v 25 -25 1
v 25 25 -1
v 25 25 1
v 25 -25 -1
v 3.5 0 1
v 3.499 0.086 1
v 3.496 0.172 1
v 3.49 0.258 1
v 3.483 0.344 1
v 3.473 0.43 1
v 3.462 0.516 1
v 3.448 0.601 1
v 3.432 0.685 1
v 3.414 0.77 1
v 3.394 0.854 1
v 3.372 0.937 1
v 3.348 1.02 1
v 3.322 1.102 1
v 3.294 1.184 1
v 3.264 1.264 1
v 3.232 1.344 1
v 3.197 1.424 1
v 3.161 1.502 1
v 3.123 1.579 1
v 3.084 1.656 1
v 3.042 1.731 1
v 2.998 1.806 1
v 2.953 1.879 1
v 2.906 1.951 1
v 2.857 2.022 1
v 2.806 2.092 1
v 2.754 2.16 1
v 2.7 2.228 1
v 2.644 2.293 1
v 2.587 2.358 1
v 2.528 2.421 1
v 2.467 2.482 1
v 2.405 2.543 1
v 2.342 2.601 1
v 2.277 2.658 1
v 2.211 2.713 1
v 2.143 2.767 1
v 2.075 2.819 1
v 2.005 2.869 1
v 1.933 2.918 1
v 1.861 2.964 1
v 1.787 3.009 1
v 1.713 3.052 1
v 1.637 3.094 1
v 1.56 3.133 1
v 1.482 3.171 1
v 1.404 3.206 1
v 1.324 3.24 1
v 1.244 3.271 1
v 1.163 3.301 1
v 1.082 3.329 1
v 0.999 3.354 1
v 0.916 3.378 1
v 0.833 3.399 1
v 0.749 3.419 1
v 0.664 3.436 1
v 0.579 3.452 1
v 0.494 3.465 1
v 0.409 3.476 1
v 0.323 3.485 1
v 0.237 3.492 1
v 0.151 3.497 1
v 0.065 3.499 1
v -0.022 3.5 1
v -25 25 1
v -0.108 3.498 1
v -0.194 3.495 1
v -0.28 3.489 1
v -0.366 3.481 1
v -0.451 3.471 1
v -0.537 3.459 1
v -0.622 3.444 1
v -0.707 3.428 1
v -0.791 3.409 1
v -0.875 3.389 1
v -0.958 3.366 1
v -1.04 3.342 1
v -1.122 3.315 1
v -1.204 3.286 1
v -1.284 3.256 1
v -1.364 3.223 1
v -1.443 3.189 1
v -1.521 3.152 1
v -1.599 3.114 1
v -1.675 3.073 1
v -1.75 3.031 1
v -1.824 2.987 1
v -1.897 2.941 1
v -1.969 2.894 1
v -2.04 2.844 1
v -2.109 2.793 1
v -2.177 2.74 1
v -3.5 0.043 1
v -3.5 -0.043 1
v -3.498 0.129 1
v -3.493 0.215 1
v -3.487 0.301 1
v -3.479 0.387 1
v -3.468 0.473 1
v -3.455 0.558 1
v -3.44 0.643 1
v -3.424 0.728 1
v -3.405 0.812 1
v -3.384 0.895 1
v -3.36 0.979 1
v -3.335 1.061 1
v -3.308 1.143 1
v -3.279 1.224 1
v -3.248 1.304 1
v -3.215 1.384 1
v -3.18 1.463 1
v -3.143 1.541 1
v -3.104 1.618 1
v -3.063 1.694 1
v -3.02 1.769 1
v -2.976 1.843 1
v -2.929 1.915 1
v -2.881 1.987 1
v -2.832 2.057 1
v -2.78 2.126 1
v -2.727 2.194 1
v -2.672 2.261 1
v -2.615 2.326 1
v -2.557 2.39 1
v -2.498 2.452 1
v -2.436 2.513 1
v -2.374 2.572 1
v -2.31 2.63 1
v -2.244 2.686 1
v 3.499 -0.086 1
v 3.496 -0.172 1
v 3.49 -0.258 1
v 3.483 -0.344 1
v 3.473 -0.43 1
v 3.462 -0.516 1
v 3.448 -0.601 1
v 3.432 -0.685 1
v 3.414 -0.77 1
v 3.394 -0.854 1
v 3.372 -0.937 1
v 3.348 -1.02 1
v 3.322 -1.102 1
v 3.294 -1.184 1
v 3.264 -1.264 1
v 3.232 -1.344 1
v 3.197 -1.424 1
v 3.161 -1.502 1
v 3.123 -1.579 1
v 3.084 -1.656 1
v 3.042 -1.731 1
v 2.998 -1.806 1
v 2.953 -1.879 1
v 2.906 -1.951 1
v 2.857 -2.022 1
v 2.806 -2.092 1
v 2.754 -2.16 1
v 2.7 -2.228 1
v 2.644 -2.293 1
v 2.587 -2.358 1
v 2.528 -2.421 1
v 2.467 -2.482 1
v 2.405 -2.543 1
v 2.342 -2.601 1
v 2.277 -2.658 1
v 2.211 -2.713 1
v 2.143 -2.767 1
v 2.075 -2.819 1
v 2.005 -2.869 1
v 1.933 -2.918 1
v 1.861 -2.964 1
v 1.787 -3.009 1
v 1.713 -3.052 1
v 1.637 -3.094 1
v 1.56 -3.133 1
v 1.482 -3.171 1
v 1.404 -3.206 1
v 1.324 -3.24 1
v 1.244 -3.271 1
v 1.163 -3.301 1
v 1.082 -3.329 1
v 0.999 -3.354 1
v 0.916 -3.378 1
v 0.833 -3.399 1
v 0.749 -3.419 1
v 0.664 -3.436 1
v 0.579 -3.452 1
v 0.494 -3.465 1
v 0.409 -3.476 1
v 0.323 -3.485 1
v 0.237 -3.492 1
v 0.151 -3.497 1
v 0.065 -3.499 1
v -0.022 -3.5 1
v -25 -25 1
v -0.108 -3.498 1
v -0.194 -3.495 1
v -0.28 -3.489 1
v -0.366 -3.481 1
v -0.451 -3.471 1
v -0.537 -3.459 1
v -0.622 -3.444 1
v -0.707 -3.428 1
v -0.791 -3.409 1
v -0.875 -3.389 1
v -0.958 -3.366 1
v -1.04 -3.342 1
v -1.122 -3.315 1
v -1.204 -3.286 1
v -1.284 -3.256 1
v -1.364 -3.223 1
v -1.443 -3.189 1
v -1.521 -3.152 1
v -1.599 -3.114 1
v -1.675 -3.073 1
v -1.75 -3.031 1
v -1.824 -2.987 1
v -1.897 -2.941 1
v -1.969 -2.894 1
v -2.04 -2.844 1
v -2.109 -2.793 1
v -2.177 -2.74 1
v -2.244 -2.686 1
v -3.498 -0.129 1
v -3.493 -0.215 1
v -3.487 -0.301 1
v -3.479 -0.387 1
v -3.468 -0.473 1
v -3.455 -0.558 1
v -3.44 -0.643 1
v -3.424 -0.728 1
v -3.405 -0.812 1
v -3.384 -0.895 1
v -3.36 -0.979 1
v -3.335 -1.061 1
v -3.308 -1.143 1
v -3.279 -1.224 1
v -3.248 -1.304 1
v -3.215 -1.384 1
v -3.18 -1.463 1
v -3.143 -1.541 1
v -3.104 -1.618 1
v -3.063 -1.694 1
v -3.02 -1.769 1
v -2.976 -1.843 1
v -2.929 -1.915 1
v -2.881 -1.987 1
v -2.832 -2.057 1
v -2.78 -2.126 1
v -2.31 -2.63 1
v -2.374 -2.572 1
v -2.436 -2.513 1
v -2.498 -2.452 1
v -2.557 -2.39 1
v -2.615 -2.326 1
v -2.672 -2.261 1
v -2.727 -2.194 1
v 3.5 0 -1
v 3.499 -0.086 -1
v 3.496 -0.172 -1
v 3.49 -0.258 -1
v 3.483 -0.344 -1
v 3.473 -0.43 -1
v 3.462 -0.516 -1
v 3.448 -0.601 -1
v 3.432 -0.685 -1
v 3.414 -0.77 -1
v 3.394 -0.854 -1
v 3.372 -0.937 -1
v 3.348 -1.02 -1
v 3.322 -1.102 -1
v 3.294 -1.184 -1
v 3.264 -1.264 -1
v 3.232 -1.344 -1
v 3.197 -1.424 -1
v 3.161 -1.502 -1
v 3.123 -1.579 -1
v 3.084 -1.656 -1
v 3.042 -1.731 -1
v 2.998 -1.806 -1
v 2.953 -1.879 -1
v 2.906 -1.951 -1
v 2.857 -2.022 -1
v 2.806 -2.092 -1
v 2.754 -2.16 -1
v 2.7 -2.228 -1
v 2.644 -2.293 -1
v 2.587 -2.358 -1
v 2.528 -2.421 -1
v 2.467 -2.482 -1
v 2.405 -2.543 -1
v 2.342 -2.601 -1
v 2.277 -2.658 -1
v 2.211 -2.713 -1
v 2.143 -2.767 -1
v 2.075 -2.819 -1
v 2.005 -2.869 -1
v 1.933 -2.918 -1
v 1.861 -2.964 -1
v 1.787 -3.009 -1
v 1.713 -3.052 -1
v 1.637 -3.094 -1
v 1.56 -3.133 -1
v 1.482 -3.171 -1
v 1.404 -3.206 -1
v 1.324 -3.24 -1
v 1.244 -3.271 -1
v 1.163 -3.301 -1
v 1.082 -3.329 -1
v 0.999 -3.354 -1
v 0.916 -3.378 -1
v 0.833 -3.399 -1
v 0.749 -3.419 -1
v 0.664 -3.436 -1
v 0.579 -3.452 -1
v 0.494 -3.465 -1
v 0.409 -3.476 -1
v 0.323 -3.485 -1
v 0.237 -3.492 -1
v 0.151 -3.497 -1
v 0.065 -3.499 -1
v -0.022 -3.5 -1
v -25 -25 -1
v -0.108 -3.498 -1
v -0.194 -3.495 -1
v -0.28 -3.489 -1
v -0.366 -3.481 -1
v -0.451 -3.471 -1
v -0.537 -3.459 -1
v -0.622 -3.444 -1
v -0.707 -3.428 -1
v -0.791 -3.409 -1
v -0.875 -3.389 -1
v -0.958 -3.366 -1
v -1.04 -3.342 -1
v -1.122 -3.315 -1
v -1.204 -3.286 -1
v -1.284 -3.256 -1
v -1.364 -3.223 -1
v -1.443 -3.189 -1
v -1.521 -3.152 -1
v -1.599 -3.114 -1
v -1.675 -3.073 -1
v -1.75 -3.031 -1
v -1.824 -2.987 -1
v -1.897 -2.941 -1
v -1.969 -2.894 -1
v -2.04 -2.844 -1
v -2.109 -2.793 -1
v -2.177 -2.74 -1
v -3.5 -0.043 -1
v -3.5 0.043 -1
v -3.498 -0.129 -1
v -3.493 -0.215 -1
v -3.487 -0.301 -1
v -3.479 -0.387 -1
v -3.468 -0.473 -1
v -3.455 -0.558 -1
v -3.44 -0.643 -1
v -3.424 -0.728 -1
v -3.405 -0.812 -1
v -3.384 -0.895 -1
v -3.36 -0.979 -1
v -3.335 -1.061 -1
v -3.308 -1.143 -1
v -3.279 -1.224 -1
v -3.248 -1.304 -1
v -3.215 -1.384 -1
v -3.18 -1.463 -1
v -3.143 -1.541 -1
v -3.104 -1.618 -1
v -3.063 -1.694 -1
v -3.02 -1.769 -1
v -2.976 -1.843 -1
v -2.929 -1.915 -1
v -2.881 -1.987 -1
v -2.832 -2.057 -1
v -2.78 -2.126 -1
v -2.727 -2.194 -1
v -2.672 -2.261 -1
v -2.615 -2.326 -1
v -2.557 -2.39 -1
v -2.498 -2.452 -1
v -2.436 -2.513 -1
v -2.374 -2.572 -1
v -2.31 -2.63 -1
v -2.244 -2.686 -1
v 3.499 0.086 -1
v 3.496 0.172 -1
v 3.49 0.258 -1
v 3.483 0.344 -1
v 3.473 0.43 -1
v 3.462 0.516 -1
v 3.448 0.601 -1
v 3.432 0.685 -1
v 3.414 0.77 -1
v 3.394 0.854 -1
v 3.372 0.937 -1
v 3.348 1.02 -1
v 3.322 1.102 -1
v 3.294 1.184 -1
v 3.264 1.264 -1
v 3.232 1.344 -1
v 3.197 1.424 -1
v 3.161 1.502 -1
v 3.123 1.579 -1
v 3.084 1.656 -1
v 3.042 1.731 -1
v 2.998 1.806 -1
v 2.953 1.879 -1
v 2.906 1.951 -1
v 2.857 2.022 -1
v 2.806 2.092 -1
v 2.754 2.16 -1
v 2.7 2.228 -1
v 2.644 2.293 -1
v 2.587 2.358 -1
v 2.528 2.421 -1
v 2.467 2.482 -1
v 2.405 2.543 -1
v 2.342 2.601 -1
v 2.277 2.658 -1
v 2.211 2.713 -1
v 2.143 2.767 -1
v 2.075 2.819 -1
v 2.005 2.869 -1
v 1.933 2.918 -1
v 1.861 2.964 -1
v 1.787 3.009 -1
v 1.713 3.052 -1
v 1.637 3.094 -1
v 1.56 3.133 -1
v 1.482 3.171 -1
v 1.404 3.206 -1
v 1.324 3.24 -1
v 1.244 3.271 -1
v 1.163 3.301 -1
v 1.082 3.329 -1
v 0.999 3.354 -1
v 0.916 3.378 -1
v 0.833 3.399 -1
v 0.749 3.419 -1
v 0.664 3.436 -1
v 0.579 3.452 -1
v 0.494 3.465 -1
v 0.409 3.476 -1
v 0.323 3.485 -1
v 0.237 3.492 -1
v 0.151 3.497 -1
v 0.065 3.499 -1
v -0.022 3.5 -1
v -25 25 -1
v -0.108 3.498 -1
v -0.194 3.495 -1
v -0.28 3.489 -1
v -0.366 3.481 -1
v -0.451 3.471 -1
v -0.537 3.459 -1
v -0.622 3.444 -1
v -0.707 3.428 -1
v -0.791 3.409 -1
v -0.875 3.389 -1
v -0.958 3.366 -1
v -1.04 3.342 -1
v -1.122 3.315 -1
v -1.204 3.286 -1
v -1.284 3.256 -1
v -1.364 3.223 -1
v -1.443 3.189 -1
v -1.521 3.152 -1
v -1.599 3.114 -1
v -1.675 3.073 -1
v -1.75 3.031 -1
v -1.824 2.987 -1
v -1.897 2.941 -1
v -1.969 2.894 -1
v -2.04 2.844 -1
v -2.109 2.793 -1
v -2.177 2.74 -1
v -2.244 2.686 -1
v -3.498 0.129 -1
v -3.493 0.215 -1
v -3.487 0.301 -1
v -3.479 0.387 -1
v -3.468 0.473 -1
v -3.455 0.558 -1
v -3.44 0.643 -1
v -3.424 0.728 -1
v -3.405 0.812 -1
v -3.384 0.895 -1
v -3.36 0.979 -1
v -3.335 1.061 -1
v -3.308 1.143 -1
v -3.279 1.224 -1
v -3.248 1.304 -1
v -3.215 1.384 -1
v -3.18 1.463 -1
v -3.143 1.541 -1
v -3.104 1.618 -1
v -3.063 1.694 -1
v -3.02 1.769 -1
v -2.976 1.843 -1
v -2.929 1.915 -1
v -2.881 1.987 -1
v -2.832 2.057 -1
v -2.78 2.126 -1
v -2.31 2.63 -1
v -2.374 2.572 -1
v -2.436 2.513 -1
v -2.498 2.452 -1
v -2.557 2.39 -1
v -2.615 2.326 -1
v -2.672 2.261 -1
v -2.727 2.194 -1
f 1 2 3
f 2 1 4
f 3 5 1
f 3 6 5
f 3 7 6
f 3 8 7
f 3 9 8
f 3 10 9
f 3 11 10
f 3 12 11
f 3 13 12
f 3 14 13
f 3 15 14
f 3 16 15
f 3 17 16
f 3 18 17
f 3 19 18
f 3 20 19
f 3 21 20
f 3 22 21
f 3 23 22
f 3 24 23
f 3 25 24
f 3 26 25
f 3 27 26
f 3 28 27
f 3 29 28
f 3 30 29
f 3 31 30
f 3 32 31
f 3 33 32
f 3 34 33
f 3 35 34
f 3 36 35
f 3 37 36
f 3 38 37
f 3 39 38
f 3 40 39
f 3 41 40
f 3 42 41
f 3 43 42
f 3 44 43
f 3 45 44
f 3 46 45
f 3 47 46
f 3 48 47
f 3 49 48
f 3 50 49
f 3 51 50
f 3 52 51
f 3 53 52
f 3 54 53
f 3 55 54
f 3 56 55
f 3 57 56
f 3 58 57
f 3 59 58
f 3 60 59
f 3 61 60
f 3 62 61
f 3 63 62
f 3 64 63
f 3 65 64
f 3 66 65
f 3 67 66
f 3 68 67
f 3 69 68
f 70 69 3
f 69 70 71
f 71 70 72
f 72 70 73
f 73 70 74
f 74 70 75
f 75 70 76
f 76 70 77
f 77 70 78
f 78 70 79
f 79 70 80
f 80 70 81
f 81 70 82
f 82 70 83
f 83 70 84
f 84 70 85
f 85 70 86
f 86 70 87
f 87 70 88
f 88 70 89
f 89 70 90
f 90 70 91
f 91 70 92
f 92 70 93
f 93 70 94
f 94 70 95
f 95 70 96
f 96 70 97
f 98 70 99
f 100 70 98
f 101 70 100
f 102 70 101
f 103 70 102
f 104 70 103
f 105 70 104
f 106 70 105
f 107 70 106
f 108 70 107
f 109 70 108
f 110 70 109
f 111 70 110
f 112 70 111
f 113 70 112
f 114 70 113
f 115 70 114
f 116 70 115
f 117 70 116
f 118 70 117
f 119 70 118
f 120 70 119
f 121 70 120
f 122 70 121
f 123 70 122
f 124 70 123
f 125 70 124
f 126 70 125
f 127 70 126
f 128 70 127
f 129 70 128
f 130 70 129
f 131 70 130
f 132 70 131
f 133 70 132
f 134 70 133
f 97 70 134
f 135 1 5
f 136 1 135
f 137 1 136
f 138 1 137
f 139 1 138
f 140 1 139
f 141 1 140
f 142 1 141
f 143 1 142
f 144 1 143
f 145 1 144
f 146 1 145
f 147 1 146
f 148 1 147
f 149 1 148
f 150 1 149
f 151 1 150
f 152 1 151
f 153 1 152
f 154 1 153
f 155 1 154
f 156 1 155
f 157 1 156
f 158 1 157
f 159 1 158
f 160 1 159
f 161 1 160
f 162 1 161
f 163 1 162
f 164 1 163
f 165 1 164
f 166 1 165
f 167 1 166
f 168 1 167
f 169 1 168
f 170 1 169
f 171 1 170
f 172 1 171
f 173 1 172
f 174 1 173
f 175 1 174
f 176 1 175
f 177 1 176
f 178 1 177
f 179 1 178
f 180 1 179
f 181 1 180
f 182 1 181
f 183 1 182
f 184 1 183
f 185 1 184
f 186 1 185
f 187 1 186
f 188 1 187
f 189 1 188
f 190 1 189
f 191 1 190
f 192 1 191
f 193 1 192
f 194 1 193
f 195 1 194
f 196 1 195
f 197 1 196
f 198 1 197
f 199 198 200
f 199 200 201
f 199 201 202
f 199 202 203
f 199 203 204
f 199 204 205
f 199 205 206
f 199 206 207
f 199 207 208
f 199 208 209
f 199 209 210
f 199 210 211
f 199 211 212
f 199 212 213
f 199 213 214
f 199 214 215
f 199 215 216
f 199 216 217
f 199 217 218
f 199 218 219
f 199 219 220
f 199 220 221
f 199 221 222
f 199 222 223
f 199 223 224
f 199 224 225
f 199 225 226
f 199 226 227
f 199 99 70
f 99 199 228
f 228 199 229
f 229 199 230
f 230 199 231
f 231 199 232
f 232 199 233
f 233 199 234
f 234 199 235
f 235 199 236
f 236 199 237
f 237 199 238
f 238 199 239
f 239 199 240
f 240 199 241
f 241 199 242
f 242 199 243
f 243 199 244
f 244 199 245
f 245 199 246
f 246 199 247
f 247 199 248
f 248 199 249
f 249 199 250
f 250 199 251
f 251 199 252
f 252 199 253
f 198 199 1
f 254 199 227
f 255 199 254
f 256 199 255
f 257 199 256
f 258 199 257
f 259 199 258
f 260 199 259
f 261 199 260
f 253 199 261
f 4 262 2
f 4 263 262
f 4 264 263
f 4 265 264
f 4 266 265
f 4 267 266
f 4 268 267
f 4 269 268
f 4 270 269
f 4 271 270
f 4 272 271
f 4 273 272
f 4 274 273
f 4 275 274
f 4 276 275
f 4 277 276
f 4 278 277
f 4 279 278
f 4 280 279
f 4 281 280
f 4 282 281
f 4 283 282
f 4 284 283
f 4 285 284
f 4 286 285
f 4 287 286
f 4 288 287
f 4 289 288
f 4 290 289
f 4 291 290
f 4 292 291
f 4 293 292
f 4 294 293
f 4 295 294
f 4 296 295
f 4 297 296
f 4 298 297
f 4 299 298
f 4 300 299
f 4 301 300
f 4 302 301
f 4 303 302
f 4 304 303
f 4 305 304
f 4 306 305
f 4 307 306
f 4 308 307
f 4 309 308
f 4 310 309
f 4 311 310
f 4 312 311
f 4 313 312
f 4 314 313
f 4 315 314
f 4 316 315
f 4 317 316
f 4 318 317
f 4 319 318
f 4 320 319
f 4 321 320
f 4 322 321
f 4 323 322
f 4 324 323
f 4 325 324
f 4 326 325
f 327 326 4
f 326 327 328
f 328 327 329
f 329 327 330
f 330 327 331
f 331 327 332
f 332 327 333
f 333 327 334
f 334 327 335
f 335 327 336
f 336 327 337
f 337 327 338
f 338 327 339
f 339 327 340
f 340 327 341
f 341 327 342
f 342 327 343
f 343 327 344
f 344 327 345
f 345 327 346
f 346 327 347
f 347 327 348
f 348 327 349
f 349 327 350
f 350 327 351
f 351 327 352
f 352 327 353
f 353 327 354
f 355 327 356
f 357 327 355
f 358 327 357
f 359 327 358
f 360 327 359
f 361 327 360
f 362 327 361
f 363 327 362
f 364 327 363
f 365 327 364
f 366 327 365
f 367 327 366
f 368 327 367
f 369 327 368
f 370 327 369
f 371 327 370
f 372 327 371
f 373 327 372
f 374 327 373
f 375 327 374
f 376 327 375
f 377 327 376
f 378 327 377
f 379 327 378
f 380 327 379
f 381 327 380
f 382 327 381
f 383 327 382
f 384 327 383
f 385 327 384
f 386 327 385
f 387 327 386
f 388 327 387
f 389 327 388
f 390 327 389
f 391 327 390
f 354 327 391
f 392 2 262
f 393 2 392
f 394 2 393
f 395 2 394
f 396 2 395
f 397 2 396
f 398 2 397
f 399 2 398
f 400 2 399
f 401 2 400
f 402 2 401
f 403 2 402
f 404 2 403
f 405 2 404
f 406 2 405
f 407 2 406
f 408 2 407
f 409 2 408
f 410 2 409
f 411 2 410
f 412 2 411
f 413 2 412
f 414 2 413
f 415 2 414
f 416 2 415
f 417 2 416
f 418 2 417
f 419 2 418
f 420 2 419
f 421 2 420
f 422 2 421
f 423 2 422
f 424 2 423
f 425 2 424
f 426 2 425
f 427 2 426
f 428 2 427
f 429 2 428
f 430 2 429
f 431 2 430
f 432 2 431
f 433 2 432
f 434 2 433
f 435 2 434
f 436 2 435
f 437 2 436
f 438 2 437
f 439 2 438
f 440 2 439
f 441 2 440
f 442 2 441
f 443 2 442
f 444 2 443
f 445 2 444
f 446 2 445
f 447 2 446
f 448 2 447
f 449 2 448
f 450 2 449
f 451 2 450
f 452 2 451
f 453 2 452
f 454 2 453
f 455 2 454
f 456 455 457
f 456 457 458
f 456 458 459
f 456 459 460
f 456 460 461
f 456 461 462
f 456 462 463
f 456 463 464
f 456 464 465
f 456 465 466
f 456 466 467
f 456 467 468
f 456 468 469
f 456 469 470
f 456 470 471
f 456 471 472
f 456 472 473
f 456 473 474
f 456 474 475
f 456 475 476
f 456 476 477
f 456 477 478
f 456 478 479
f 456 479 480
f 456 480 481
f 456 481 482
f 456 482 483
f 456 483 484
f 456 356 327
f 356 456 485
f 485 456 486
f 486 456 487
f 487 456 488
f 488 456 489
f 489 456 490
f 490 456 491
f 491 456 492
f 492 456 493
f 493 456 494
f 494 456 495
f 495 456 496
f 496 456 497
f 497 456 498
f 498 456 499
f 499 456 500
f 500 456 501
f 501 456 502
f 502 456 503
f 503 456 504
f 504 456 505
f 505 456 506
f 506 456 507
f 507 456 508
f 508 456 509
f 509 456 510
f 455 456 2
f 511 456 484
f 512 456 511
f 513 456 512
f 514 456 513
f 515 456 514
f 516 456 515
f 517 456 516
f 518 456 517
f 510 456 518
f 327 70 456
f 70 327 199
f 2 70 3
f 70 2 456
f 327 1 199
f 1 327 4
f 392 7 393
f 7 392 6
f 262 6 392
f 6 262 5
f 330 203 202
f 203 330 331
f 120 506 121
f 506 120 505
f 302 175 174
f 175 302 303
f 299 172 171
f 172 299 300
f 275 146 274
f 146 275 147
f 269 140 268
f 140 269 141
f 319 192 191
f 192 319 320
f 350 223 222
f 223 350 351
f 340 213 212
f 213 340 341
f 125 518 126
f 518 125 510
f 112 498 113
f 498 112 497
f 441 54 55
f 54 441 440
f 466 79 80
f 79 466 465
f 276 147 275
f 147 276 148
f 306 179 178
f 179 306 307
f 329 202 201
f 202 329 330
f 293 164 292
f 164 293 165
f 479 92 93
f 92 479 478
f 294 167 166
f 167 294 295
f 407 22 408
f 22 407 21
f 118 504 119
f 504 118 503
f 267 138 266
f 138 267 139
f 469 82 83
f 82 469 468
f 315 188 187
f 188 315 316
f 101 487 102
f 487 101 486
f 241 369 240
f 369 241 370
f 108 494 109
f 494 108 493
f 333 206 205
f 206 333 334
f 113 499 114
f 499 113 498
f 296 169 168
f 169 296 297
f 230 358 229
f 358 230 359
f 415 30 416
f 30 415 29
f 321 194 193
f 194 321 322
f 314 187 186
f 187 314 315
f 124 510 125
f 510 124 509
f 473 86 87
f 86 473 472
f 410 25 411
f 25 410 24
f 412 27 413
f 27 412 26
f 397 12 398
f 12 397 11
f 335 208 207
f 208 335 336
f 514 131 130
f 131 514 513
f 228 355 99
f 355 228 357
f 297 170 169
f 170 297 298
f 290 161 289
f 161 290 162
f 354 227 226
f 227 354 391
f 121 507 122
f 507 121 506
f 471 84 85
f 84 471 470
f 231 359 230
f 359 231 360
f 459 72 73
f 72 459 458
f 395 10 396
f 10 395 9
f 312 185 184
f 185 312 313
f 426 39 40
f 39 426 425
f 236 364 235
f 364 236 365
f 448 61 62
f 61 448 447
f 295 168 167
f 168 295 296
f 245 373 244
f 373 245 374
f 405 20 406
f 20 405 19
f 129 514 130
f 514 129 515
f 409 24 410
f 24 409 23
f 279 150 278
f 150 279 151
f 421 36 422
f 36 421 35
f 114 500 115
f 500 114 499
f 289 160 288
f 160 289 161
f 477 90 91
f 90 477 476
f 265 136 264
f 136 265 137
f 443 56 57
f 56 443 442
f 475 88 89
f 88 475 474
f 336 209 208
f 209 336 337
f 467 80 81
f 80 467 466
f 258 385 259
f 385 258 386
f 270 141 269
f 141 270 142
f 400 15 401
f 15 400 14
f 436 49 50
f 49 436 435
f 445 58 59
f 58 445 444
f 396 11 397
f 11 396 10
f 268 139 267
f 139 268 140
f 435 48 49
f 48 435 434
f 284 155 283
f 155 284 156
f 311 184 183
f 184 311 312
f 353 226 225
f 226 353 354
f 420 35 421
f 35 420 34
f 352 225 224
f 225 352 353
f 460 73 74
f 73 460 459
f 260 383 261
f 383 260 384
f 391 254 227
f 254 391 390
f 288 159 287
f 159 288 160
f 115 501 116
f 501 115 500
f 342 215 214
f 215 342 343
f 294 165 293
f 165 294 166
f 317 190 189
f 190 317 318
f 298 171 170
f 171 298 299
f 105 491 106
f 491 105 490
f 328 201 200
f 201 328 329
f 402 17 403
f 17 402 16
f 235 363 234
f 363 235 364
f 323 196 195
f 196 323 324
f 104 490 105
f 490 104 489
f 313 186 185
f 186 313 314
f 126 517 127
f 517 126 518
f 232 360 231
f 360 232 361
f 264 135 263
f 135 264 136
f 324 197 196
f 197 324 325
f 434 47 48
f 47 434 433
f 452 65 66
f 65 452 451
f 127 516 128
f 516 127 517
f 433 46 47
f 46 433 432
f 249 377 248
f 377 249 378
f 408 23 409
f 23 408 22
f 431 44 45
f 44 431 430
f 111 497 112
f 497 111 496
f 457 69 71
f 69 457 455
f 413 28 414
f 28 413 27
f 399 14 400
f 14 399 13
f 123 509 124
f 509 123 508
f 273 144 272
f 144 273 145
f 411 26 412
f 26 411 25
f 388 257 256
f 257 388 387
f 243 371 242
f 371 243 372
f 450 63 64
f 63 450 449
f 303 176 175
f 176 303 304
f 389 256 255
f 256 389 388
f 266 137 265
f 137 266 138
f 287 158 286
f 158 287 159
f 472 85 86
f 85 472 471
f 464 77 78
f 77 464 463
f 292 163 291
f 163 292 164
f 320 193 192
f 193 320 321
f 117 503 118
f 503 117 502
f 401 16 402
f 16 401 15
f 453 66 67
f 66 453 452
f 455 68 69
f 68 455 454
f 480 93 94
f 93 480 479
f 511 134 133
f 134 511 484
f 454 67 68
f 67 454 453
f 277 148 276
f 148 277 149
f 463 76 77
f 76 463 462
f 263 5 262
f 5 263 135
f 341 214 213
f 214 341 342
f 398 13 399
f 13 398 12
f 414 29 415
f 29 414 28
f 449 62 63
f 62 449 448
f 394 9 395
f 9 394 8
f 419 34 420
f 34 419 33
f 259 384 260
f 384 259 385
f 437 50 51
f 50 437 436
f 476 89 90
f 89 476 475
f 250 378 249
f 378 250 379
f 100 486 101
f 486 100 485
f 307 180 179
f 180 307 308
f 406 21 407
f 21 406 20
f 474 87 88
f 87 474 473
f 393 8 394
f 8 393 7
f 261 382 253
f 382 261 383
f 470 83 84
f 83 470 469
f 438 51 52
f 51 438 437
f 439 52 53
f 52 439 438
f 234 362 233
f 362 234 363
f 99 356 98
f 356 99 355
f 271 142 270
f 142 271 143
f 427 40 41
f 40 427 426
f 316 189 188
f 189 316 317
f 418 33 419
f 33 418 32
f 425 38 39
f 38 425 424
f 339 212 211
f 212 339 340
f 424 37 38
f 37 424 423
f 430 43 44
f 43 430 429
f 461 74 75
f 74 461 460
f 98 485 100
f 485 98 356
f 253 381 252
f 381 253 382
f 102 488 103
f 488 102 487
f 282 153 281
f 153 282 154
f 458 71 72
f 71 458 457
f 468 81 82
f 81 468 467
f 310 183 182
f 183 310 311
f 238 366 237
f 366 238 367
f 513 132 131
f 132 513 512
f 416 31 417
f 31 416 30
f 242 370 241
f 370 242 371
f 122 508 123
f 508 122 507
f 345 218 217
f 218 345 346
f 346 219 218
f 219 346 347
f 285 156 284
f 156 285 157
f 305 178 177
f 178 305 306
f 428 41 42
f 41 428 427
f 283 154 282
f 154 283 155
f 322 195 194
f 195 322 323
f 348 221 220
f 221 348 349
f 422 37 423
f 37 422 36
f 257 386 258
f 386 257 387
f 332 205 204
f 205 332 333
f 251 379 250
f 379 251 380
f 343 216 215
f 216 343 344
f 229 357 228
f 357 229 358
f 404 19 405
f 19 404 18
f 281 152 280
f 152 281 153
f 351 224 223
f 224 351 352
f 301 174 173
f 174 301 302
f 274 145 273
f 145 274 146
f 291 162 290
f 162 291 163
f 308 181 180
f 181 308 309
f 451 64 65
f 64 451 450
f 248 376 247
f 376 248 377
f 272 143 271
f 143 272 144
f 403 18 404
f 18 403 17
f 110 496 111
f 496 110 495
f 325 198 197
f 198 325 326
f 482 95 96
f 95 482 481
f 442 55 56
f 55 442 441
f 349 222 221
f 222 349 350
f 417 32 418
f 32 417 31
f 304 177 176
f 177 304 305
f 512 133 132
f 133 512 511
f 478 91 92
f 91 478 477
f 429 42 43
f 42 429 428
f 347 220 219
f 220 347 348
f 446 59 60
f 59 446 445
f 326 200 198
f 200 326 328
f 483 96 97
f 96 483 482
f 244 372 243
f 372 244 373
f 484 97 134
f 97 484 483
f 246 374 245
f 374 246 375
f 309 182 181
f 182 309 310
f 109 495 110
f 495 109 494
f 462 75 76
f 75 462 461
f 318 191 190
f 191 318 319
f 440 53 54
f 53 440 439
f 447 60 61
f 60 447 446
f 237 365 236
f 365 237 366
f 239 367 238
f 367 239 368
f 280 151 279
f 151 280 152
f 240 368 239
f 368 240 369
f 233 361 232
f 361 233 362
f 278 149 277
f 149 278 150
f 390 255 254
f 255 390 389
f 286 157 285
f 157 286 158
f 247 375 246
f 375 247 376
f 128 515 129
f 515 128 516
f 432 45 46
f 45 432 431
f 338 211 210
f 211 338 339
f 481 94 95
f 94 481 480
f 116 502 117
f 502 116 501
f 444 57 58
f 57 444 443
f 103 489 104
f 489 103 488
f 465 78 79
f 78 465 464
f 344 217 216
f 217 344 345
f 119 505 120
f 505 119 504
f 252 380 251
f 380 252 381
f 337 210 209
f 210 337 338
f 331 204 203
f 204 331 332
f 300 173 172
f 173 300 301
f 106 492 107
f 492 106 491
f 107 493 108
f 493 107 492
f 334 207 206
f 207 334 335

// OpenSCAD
/*
Prusa Lack Enclosure 2mm remix

Copyright 2024 nomike[AT]nomike[DOT]com
Original design by Prusa Research.

Redistribution and use in source and binary forms, with or without
modification, are permitted provided that the following conditions are met:

1. Redistributions of source code must retain the above copyright notice, this
list of conditions and the following disclaimer.

2. Redistributions in binary form must reproduce the above copyright notice,
this list of conditions and the following disclaimer in the documentation
and/or other materials provided with the distribution.

THIS SOFTWARE IS PROVIDED BY THE COPYRIGHT HOLDERS AND CONTRIBUTORS “AS IS” AND
ANY EXPRESS OR IMPLIED WARRANTIES, INCLUDING, BUT NOT LIMITED TO, THE IMPLIED
WARRANTIES OF MERCHANTABILITY AND FITNESS FOR A PARTICULAR PURPOSE ARE
DISCLAIMED. IN NO EVENT SHALL THE COPYRIGHT HOLDER OR CONTRIBUTORS BE LIABLE FOR
ANY DIRECT, INDIRECT, INCIDENTAL, SPECIAL, EXEMPLARY, OR CONSEQUENTIAL DAMAGES
(INCLUDING, BUT NOT LIMITED TO, PROCUREMENT OF SUBSTITUTE GOODS OR SERVICES;
LOSS OF USE, DATA, OR PROFITS; OR BUSINESS INTERRUPTION) HOWEVER CAUSED AND ON
ANY THEORY OF LIABILITY, WHETHER IN CONTRACT, STRICT LIABILITY, OR TORT
(INCLUDING NEGLIGENCE OR OTHERWISE) ARISING IN ANY WAY OUT OF THE USE OF THIS
SOFTWARE, EVEN IF ADVISED OF THE POSSIBILITY OF SUCH DAMAGE.
*/

/*

As I lasercutted the plexiglass panels they ended up being a little bit too high. So I designes this spacer to make enough room for them.
*/

thickness = 2;

difference() {
    cube([50, 50, thickness], center=true);
    cylinder(r=3.5, h=thickness, $fn=255, center=true);
}
